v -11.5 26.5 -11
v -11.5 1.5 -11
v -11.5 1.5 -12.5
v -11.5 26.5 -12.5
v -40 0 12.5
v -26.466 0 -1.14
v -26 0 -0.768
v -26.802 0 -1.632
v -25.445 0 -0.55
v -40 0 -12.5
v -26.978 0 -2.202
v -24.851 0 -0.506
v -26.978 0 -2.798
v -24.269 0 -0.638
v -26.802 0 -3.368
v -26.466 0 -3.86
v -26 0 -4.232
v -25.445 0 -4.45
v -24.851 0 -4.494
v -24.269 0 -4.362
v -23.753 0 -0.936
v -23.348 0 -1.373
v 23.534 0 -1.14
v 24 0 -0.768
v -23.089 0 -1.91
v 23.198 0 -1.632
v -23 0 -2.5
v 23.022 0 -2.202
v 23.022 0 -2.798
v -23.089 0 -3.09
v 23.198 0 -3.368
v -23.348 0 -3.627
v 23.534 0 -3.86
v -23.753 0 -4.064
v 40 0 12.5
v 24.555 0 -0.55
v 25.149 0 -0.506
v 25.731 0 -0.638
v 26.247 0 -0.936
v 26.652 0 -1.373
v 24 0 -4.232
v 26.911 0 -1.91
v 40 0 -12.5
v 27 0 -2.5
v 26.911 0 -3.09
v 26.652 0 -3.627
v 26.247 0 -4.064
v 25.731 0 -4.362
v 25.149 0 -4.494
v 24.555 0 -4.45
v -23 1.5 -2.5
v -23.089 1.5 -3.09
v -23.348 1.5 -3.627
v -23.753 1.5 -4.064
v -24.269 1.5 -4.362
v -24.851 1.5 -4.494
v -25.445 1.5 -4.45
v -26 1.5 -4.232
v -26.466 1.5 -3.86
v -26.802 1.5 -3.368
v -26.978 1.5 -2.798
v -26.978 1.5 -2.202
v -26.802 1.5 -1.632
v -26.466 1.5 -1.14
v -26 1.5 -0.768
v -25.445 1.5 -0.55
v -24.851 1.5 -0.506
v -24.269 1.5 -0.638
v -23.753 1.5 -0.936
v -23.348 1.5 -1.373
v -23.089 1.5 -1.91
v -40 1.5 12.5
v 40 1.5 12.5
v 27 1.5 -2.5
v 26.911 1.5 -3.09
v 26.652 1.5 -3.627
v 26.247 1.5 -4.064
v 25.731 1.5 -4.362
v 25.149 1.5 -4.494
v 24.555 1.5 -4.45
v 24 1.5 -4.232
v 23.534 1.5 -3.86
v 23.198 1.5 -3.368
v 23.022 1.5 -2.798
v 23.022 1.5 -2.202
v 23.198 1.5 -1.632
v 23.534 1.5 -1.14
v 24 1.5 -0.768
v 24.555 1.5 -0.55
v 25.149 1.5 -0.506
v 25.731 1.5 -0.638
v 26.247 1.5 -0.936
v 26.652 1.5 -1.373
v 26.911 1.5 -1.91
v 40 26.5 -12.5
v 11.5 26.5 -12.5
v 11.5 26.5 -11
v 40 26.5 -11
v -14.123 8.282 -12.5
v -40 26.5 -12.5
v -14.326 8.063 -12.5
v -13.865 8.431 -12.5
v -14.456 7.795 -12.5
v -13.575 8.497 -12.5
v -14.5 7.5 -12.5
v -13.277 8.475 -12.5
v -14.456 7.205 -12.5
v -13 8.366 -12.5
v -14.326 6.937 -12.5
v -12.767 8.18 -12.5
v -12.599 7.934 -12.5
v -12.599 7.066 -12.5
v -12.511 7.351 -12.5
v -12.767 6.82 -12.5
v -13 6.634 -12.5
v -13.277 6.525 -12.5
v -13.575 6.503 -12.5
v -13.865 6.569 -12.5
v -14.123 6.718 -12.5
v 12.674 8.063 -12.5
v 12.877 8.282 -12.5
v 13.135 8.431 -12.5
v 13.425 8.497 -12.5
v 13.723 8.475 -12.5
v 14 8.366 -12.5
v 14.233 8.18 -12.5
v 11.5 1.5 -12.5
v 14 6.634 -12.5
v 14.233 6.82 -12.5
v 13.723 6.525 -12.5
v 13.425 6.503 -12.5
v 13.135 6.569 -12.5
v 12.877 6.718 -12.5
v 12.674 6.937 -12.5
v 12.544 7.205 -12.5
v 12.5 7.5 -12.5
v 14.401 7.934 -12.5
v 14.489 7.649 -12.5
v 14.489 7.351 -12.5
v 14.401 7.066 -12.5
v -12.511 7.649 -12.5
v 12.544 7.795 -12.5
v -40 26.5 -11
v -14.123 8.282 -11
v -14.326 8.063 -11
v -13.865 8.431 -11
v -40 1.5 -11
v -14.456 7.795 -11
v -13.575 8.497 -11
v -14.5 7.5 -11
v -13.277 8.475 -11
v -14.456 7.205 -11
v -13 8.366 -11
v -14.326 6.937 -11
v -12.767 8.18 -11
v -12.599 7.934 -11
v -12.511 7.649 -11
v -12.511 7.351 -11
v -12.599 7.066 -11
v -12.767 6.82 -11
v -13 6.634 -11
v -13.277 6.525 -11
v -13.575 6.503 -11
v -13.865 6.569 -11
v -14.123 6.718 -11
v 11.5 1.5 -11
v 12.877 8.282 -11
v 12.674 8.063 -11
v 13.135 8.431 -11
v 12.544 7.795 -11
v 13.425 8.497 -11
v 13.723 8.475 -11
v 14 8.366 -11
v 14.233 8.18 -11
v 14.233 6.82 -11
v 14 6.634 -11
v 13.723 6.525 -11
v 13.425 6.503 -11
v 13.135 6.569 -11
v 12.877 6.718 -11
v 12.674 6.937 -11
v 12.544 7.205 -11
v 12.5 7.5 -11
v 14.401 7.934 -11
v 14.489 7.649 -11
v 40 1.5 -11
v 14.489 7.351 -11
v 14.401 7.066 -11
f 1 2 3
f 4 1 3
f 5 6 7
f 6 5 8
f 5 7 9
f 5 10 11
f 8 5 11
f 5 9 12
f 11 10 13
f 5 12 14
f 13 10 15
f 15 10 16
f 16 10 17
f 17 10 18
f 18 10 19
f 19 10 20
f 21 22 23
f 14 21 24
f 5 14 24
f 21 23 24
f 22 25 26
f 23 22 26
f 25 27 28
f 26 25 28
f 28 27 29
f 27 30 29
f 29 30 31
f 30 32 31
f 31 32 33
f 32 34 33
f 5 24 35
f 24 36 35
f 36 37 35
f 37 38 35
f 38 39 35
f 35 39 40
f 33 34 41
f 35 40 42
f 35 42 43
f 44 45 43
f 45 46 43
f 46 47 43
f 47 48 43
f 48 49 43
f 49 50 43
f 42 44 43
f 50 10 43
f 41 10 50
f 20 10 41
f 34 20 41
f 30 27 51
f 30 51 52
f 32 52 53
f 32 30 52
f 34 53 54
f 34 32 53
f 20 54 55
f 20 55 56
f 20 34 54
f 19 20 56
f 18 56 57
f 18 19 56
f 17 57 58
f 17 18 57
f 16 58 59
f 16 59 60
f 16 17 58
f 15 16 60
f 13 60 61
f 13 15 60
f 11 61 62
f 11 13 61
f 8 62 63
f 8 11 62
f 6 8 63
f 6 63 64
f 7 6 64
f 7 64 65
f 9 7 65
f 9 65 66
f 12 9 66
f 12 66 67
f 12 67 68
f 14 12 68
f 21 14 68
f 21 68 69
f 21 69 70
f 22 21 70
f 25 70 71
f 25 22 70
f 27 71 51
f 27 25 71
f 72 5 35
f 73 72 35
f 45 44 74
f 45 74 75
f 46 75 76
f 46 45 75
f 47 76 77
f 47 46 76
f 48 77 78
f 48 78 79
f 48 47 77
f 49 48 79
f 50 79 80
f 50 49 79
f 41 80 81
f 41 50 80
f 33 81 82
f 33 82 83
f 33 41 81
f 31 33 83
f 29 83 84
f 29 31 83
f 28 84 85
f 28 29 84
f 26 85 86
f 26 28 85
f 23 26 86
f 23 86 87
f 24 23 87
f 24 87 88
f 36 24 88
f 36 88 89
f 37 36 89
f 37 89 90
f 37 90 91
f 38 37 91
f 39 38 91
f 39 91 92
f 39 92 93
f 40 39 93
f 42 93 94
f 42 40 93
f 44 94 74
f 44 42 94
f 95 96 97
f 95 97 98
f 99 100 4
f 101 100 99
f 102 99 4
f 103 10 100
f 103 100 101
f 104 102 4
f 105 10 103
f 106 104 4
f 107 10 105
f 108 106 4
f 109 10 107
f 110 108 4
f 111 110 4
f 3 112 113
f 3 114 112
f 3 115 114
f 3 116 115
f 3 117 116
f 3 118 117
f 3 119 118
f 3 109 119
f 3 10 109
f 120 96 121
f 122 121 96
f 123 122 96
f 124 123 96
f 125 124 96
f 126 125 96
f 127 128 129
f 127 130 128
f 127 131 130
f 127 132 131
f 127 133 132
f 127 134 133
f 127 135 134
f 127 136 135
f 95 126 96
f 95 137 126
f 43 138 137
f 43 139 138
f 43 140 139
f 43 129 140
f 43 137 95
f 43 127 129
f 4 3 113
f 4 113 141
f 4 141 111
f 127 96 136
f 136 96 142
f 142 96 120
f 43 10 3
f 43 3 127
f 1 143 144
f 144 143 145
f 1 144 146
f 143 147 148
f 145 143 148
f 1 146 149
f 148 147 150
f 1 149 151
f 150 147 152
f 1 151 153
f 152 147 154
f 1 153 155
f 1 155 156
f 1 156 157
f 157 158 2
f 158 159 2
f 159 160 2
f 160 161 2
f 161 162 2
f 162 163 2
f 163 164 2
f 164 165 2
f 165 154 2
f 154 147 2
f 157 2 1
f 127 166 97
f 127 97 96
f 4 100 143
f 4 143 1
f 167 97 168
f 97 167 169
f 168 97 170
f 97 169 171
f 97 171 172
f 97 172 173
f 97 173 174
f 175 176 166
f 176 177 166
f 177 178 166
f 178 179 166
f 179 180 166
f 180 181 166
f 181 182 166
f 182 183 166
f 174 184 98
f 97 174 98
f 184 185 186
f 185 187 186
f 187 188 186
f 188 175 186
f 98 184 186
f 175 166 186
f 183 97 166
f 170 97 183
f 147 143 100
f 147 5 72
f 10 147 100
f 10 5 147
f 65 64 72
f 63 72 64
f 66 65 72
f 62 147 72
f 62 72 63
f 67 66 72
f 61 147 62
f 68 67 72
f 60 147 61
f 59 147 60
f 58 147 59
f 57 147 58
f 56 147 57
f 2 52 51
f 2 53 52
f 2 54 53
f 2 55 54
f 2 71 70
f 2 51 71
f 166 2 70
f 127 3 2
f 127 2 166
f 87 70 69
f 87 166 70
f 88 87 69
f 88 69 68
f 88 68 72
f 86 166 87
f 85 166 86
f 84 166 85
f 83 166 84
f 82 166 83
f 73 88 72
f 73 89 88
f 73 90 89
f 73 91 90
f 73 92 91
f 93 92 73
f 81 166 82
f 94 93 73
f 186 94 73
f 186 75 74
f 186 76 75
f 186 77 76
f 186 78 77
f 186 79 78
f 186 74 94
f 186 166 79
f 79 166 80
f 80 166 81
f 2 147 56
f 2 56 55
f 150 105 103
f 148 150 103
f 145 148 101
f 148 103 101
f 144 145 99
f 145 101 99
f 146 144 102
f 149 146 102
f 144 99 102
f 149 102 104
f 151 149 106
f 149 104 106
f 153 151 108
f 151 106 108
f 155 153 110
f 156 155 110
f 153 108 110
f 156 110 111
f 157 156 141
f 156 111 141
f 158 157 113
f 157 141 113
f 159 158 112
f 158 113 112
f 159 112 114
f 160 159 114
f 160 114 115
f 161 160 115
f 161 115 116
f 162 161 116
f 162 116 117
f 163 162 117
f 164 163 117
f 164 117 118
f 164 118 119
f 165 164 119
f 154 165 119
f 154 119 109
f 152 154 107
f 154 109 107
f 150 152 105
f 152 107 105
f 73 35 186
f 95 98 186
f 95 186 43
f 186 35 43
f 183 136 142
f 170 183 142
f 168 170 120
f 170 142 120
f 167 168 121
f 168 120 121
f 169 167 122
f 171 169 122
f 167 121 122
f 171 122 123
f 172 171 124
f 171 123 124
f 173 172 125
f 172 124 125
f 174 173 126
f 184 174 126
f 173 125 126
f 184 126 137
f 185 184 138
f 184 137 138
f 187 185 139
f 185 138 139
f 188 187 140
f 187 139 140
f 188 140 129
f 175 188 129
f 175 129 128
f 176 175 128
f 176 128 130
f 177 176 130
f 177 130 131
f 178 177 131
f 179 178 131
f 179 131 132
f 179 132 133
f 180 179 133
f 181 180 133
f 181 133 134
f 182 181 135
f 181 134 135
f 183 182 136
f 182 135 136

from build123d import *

# Parameters (mm, degrees)
SKETCH1_W           = 80
SKETCH1_H           = 25
SKETCH1_R           = 2
BOSS_EXTRUDE1_DEPTH = 1.5
SKETCH2_W           = 28.5
SKETCH2_H           = 1.5
BOSS_EXTRUDE2_DEPTH = 25
SKETCH3_R           = 1
CUT_EXTRUDE1_DEPTH  = 1.5


with BuildPart() as part:
    # Sketch1 → Boss-Extrude1 (new body)
    with BuildSketch(Plane(origin=(0, 0, 0), x_dir=(1, 0, 0), z_dir=(0, 1, 0))):
        Rectangle(SKETCH1_W, SKETCH1_H)
        with Locations((-25, 2.5)):
            Circle(SKETCH1_R, mode=Mode.SUBTRACT)
        with Locations((25, 2.5)):
            Circle(SKETCH1_R, mode=Mode.SUBTRACT)
    extrude(amount=BOSS_EXTRUDE1_DEPTH)

    # Sketch2 → Boss-Extrude2 (add)
    with BuildSketch(Plane(origin=(0, 1.5, 0), x_dir=(1, 0, 0), z_dir=(0, 1, 0))):
        with Locations((-25.75, 11.75)):
            Rectangle(SKETCH2_W, SKETCH2_H)
        with Locations((25.75, 11.75)):
            Rectangle(SKETCH2_W, SKETCH2_H)
    extrude(amount=BOSS_EXTRUDE2_DEPTH)

    # Sketch3 → Cut-Extrude1 (cut)
    with BuildSketch(Plane(origin=(0, 0, -12.5), x_dir=(-1, 0, 0), z_dir=(0, 0, -1))):
        with Locations((13.5, 7.5)):
            Circle(SKETCH3_R)
        with Locations((-13.5, 7.5)):
            Circle(SKETCH3_R)
    extrude(amount=-CUT_EXTRUDE1_DEPTH, mode=Mode.SUBTRACT)


solid = part.part
